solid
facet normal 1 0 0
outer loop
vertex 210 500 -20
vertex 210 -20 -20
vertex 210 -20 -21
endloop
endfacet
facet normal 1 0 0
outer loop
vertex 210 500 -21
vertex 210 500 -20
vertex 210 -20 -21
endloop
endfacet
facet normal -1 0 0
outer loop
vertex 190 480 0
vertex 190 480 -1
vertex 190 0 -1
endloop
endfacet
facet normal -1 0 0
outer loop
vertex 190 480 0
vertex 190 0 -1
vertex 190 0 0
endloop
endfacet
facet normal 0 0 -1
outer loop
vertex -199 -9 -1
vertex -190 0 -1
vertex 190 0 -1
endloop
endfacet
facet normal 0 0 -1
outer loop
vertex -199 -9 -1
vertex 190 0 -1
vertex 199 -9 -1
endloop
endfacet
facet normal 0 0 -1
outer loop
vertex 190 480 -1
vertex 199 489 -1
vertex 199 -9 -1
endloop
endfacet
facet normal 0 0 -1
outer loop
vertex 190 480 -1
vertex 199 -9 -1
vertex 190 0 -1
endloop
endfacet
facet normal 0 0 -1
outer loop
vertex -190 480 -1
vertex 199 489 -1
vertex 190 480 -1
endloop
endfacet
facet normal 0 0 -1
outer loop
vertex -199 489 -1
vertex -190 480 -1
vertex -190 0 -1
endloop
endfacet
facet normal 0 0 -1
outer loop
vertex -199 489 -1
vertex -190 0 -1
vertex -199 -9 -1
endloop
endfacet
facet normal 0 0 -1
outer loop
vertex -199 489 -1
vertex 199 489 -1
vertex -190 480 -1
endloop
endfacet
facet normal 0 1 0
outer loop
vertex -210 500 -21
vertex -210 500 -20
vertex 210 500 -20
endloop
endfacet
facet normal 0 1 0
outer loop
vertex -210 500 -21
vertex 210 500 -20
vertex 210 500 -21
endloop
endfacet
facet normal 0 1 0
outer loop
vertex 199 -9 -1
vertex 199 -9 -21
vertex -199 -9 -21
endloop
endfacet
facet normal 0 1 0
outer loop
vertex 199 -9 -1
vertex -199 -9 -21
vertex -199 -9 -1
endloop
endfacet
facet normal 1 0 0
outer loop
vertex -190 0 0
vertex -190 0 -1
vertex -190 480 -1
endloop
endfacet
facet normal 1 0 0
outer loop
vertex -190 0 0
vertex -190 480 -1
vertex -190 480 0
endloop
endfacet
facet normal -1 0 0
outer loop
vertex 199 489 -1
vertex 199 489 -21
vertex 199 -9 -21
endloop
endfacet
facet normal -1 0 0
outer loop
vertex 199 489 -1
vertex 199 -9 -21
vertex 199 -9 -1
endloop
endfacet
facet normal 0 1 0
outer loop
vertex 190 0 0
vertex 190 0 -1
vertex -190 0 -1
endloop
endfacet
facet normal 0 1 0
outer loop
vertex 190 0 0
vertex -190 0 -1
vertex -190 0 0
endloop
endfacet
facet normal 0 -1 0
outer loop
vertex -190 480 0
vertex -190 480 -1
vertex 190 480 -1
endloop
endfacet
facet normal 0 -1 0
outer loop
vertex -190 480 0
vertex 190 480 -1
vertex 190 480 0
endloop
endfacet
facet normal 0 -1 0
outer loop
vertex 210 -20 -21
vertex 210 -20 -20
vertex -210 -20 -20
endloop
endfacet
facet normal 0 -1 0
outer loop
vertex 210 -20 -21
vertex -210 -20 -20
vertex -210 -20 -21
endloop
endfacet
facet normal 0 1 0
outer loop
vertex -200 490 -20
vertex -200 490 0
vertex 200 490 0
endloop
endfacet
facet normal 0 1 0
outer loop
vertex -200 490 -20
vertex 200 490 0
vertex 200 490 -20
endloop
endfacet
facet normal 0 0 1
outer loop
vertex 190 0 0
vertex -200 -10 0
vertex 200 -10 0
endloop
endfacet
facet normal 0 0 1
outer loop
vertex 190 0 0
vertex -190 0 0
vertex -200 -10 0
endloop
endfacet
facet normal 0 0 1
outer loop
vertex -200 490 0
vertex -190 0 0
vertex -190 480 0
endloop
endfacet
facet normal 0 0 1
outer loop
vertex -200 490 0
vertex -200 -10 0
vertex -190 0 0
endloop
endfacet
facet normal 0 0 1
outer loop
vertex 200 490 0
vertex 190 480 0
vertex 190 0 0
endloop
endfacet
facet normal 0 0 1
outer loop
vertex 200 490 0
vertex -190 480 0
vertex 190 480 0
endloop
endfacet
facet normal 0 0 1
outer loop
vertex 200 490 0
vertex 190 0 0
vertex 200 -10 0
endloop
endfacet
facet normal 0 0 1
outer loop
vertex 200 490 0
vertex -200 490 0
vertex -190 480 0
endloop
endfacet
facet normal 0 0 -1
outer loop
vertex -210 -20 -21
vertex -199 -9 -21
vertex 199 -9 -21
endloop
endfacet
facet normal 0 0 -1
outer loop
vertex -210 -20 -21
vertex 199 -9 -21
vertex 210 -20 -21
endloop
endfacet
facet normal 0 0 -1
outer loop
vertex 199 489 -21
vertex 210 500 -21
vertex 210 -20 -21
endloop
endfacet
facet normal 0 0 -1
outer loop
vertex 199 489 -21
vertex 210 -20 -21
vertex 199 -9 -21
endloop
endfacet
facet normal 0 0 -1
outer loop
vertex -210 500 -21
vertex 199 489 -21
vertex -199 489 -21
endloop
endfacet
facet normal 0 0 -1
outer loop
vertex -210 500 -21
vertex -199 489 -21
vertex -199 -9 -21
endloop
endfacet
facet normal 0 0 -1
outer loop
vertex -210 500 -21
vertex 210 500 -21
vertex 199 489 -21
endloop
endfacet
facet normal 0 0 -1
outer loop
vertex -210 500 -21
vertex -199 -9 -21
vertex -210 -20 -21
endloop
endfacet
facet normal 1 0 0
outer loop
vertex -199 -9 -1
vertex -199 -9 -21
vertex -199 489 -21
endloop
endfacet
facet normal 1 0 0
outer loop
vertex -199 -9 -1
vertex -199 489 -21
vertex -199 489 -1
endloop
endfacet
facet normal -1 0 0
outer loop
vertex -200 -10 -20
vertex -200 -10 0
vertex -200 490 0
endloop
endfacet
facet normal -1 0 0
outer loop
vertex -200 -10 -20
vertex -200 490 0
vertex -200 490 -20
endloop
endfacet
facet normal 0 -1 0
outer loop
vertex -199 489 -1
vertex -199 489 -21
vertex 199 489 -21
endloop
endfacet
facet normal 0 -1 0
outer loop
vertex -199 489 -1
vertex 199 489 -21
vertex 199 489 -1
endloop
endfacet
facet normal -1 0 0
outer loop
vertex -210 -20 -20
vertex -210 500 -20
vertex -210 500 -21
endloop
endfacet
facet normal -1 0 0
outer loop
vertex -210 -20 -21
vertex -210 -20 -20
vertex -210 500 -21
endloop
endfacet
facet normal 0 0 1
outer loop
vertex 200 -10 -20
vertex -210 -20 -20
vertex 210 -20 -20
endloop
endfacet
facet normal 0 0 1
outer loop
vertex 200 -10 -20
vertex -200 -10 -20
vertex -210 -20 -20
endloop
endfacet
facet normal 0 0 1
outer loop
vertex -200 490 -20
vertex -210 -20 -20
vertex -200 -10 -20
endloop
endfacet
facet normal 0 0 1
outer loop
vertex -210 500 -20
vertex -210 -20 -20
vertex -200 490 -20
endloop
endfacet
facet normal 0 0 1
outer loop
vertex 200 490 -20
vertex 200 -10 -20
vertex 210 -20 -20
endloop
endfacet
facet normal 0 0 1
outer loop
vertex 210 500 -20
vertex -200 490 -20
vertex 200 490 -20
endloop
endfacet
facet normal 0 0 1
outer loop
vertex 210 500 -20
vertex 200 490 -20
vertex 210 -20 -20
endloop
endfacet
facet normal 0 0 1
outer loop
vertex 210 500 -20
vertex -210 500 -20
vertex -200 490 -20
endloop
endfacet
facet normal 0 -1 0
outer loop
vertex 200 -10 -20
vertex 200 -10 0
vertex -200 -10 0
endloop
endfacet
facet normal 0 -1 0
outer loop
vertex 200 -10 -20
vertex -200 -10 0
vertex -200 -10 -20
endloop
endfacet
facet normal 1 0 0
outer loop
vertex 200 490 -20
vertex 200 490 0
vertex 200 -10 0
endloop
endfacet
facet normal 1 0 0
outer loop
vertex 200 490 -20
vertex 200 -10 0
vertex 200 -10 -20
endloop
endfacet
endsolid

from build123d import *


with BuildPart() as f2:
    # F2: sweep along a path in F1
    with BuildLine(Plane.XY) as f2_path:
        Line((0, -10), (200, -10))
        Line((200, -10), (200, 490))
        Line((200, 490), (-200, 490))
        Line((-200, 490), (-200, -10))
        Line((-200, -10), (0, -10))
    # F0 (on Right) → F2 (sweep)
    with BuildSketch(Plane.YZ):
        Polygon((0, -1), (0, 0), (-10, 0), (-10, -20), (-20, -20), (-20, -21), (-9, -21), (-9, -1), align=None)
    sweep(path=f2_path.line, transition=Transition.RIGHT)


solid = f2.part
